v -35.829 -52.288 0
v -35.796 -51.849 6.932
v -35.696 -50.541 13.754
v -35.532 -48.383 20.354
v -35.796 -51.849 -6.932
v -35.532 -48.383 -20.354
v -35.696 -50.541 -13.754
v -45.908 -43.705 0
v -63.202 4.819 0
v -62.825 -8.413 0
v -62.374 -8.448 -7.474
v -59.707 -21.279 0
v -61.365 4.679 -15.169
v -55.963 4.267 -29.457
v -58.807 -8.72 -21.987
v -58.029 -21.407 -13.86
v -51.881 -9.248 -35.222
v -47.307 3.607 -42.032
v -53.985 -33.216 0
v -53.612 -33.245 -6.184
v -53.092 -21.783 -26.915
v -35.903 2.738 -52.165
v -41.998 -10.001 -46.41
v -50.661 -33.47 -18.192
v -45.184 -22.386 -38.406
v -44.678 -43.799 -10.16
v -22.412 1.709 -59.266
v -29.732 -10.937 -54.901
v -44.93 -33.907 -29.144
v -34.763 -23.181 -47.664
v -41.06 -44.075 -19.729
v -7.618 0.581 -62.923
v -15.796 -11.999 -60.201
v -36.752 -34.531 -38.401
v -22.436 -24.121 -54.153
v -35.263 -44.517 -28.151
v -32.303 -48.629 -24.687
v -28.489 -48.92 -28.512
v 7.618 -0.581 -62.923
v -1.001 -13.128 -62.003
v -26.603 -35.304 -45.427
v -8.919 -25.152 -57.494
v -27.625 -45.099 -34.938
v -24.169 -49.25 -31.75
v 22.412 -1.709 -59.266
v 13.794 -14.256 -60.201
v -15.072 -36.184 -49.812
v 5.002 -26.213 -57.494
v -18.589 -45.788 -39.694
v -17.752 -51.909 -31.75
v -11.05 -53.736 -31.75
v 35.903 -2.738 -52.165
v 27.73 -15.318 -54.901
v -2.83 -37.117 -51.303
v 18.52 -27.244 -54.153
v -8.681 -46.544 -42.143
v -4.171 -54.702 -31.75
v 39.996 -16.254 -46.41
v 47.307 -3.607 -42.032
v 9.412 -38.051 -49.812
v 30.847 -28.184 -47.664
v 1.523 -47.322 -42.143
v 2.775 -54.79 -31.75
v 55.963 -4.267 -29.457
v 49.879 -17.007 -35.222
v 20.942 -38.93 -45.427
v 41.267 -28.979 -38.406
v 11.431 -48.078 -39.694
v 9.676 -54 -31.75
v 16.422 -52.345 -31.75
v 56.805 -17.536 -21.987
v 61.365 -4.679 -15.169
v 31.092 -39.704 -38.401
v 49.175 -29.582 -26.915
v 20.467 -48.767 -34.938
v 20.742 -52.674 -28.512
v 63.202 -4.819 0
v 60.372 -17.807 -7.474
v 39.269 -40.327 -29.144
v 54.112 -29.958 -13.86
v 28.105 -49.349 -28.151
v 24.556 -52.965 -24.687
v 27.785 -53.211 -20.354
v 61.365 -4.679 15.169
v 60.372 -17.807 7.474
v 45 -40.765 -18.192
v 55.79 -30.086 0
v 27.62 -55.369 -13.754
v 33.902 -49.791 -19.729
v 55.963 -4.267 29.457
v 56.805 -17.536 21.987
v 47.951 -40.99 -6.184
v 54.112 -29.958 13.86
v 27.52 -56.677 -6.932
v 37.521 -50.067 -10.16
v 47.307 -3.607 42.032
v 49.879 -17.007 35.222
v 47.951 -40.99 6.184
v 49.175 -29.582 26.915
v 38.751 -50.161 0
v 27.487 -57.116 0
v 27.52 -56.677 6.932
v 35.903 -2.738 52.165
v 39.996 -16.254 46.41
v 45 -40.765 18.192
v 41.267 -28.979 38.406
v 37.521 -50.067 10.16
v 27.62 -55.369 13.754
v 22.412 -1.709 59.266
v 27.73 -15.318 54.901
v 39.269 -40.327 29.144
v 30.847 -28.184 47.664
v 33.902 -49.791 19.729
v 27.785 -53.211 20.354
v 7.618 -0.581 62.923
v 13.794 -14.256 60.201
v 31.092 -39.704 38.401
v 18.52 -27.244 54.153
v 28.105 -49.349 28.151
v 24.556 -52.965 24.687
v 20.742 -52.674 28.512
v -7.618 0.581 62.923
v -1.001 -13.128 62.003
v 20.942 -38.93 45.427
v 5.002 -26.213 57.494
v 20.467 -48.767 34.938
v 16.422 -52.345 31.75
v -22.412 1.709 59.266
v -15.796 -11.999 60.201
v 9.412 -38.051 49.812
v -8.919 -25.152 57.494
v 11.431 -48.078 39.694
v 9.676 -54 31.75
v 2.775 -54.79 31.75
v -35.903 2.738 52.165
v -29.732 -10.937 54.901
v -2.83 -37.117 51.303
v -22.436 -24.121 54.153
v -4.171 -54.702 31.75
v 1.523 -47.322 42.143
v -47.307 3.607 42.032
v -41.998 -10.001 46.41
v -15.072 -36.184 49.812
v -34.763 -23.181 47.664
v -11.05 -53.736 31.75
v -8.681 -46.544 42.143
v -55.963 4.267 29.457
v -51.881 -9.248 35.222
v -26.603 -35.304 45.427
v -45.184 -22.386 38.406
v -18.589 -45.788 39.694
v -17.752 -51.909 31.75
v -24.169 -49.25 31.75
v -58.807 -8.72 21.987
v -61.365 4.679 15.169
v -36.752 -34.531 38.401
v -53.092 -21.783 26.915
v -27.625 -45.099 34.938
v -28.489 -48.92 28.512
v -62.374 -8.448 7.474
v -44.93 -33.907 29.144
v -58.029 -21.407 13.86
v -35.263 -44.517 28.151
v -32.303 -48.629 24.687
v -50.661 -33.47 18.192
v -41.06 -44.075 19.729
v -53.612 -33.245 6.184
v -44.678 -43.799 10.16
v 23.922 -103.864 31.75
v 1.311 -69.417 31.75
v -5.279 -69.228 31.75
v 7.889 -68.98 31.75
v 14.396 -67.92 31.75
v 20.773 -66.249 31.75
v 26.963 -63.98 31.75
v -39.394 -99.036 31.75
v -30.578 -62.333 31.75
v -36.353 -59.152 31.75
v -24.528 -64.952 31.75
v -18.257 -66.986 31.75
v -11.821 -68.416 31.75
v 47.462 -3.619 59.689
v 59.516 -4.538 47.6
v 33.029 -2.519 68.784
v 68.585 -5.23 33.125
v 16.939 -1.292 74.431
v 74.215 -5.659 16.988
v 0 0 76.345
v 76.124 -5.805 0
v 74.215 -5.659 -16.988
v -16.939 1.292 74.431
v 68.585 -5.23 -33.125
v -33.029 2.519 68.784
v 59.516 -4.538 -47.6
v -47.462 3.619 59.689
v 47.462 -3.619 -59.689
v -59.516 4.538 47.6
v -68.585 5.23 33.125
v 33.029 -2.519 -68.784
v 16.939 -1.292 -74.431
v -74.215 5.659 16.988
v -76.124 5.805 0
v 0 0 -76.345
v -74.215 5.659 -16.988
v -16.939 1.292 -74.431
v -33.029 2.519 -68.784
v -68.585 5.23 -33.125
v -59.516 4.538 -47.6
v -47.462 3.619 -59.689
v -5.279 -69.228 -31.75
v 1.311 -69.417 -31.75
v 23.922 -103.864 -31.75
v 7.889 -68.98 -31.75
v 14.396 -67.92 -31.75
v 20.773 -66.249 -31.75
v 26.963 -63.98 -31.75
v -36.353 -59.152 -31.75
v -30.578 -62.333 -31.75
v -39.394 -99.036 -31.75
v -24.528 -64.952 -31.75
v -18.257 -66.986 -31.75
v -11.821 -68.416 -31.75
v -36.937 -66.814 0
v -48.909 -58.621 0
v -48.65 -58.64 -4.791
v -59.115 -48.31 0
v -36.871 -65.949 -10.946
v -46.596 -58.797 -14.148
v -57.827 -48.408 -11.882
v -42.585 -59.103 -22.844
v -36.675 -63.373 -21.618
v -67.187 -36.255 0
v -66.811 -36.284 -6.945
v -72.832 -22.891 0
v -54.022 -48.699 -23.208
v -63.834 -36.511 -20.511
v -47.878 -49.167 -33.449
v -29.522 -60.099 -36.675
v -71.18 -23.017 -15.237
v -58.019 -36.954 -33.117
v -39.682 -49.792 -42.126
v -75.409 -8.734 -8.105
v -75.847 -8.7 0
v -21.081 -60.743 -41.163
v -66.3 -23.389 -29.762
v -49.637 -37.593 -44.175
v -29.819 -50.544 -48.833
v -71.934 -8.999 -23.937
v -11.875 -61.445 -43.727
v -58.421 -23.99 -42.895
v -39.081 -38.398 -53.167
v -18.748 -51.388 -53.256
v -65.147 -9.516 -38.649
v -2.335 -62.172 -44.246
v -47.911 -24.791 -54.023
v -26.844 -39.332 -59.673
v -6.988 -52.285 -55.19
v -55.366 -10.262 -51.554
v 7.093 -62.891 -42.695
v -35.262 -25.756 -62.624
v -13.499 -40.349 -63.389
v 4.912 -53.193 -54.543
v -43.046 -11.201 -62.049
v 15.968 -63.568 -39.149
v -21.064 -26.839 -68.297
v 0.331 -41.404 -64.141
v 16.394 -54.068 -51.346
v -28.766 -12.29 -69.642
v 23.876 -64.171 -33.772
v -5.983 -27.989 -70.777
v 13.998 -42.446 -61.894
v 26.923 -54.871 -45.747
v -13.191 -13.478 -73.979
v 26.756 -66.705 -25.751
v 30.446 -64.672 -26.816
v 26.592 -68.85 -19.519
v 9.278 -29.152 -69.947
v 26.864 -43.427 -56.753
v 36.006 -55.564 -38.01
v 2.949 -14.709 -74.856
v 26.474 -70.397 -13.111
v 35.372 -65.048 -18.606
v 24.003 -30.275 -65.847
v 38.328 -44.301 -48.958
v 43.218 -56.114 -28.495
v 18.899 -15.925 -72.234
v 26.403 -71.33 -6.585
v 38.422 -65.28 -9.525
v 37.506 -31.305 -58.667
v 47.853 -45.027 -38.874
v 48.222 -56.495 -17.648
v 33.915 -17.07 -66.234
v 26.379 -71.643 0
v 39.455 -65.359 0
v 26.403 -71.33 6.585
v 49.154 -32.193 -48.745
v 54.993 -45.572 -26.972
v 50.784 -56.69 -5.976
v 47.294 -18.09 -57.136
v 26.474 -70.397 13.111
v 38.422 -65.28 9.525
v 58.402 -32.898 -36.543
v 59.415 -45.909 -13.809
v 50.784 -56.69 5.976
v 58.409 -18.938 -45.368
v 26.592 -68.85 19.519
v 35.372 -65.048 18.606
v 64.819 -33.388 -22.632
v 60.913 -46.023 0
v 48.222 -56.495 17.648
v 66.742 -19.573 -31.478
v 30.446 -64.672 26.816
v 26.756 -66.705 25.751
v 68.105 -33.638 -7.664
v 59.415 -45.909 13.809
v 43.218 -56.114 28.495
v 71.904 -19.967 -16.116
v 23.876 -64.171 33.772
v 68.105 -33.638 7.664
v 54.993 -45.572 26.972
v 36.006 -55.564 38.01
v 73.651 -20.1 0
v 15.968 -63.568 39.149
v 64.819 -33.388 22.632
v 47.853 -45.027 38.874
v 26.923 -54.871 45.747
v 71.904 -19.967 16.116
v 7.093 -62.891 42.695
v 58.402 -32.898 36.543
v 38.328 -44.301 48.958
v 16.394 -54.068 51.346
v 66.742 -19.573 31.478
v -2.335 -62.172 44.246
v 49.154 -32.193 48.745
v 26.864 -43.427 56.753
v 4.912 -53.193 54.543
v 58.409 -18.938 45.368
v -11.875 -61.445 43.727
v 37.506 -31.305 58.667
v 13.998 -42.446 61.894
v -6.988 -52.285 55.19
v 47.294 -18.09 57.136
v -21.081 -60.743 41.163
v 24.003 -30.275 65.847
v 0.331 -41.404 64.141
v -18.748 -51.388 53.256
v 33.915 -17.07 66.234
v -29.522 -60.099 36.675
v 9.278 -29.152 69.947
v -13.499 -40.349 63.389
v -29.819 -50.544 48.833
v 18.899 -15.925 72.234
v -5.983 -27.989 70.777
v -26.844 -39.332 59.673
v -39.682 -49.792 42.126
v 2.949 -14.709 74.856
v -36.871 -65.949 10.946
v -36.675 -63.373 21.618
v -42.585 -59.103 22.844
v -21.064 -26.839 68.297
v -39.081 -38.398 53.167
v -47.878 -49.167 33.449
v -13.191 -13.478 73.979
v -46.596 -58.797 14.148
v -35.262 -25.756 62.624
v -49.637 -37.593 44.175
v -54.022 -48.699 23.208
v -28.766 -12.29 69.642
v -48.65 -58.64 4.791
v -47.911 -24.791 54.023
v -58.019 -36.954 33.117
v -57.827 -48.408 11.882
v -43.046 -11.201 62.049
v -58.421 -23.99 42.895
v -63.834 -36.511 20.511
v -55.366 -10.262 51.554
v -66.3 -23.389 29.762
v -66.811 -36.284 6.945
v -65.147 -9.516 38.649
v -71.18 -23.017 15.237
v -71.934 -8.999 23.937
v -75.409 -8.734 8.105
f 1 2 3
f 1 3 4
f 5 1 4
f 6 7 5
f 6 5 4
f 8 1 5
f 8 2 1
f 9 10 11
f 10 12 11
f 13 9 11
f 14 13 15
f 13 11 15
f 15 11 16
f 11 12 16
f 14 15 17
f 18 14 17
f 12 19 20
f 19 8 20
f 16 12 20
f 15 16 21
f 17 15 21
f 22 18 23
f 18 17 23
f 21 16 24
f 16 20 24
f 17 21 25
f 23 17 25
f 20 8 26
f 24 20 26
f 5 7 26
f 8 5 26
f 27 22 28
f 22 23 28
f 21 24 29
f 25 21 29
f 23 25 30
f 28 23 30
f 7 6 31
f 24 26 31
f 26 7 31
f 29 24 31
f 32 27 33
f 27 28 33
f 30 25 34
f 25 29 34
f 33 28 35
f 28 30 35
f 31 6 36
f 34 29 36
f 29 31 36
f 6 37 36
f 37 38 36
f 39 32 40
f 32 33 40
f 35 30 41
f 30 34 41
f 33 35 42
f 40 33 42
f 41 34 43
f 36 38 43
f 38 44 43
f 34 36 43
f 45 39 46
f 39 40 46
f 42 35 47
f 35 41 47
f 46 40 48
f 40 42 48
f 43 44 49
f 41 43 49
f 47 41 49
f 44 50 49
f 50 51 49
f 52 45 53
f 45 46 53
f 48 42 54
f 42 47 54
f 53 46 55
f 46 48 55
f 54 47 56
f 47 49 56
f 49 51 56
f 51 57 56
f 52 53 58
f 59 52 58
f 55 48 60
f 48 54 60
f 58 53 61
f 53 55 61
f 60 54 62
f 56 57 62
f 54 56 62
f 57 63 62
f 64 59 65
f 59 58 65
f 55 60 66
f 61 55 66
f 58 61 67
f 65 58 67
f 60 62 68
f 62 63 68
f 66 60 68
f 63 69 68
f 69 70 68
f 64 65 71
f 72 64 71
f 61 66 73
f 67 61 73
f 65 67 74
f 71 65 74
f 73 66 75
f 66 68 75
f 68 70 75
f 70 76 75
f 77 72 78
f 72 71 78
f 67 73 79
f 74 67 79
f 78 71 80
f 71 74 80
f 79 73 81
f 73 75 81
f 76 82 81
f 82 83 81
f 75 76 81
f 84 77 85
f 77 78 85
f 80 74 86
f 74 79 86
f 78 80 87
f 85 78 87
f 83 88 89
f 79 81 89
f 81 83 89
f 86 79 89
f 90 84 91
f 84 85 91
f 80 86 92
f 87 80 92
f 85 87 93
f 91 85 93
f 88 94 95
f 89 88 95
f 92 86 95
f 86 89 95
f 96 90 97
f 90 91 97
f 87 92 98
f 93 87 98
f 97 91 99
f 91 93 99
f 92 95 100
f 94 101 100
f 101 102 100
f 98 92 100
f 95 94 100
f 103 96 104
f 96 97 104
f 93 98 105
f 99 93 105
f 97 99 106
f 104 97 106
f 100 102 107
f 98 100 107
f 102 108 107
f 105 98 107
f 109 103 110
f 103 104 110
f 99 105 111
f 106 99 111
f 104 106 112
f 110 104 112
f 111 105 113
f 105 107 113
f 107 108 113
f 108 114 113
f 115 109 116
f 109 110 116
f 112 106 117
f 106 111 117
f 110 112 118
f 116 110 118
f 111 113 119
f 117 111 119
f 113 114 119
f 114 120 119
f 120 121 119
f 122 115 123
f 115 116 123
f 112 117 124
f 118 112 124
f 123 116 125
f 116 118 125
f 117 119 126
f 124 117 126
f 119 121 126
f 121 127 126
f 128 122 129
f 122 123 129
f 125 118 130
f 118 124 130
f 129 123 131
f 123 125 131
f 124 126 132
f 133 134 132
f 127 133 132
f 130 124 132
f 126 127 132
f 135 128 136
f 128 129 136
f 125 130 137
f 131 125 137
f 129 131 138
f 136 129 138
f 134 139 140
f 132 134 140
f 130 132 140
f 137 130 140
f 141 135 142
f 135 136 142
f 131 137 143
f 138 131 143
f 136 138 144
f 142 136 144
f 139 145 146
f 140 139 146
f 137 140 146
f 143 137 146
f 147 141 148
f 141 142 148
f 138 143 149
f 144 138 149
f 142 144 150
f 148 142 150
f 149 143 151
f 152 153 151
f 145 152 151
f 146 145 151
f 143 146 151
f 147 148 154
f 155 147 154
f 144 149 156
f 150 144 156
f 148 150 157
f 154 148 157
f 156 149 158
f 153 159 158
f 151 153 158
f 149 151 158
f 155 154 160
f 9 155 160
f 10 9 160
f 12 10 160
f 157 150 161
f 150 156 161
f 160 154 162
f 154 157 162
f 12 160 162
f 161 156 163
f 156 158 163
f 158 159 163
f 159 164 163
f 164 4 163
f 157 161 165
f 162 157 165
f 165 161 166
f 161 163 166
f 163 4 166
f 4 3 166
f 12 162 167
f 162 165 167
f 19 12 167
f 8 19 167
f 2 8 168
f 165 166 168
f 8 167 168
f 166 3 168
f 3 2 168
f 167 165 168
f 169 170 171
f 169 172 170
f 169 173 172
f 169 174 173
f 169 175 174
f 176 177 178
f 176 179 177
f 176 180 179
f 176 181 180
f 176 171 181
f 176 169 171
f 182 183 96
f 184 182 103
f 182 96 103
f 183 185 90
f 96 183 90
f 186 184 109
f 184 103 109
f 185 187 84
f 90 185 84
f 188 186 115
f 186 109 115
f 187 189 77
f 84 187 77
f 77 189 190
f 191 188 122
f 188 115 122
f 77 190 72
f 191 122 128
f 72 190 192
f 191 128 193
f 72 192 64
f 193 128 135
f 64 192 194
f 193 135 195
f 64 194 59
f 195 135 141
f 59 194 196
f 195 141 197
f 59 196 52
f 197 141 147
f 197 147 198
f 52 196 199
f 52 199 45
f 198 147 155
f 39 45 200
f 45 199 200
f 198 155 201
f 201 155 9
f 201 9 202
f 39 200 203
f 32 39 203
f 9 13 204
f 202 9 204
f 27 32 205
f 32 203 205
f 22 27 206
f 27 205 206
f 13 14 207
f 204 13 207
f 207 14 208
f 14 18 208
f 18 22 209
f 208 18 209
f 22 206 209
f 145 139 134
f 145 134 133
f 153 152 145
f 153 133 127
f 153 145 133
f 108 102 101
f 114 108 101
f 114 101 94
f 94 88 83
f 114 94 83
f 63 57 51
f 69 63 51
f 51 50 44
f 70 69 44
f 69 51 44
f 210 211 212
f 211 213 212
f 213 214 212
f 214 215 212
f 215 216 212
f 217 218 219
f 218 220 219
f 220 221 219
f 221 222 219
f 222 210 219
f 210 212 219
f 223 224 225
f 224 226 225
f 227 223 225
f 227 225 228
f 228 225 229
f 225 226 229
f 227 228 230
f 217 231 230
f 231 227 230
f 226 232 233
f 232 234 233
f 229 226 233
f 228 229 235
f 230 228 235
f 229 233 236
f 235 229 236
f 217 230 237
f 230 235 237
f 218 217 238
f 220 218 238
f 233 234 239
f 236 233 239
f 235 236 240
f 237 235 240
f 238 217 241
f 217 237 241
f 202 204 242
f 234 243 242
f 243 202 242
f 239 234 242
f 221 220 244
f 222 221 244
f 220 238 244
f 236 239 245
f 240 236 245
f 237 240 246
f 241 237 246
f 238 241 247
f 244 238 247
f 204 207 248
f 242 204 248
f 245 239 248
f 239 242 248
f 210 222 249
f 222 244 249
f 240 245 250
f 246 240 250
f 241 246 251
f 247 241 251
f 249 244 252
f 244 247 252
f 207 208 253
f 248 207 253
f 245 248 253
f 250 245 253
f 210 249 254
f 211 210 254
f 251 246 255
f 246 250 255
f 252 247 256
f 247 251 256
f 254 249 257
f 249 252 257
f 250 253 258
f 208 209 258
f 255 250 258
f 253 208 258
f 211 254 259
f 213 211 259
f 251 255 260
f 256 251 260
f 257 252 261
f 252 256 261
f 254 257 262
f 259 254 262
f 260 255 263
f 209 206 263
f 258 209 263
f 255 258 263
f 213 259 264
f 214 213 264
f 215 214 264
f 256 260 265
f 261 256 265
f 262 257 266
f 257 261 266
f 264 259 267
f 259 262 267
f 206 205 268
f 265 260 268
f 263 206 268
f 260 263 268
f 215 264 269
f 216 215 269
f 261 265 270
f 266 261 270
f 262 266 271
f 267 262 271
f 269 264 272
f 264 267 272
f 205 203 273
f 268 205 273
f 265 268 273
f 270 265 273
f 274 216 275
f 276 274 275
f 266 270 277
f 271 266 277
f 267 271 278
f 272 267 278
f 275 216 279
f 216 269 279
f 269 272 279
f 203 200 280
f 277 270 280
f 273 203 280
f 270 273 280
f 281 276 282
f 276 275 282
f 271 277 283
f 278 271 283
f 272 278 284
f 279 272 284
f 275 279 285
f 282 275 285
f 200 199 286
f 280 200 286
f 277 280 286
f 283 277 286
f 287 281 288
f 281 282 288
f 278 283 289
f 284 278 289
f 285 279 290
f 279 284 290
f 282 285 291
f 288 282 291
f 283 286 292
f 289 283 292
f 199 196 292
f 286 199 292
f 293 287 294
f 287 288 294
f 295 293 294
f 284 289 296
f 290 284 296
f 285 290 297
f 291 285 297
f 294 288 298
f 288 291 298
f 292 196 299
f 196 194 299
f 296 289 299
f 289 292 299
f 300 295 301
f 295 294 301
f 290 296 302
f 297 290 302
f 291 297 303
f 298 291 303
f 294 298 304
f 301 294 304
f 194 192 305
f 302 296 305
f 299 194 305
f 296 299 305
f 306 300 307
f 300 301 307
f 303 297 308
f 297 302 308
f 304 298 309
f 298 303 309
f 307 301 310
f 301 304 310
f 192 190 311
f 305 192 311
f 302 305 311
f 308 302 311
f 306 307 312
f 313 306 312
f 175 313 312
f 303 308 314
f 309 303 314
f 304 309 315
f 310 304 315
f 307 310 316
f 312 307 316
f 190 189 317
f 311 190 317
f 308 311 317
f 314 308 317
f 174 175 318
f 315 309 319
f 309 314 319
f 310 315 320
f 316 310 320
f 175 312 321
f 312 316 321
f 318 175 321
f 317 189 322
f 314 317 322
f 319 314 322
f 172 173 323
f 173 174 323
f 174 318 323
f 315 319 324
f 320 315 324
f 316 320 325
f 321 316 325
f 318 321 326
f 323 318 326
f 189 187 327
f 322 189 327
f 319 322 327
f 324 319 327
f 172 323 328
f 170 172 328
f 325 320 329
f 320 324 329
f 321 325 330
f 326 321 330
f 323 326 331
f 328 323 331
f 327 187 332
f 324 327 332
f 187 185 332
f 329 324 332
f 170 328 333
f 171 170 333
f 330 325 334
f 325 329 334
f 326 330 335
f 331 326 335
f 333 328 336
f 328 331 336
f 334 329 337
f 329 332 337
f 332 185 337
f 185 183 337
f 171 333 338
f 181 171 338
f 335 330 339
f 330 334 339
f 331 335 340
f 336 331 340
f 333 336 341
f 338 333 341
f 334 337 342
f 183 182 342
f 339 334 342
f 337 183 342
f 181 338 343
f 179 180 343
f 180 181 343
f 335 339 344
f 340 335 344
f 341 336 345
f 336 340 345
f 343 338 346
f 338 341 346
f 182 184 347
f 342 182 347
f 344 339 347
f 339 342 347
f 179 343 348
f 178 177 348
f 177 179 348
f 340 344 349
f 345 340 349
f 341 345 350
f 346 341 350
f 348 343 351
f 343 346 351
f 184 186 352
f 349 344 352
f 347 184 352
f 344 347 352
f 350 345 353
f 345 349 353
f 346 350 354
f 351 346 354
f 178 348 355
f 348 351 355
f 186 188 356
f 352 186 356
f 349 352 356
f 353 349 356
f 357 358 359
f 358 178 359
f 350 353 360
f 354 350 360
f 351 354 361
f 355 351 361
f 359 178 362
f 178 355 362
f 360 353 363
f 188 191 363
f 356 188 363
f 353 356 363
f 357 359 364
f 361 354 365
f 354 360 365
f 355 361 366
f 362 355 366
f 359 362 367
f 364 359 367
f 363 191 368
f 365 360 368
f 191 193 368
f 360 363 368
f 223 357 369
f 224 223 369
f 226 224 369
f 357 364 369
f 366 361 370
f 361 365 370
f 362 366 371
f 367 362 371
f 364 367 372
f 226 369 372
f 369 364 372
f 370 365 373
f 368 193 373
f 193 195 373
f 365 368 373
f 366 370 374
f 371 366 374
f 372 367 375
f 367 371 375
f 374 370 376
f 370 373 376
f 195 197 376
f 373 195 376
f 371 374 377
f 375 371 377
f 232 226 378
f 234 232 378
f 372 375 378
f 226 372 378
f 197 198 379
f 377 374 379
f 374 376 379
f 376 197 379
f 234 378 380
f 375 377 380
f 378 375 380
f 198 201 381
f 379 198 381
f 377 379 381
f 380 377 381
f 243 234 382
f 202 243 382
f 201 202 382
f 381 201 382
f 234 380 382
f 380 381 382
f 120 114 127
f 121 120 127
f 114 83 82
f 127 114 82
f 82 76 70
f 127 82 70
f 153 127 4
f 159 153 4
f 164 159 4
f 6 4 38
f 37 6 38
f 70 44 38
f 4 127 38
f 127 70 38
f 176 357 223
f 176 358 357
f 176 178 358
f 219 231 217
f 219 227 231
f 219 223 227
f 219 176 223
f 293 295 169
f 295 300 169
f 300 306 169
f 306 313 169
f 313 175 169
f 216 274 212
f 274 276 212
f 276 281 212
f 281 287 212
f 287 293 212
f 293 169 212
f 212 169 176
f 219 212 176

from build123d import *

# Parameters (mm, degrees)
BOSS_EXTRUDE2_DEPTH      = 25.4
BOSS_EXTRUDE2_DEPTH_BACK = 25.4
SKETCH3_W                = 63.5
SKETCH3_H                = 63.5


with BuildPart() as part:
    # Sketch1 → Revolve1 (revolve)
    with BuildSketch(Plane.XY):
        with BuildLine():
            Line((-76.123658673, 5.804761032), (-63.20203376, 4.819430767))
            ThreePointArc((-63.20203376, 4.819430767), (-48.098438833, -41.28273448), (-4.819430767, -63.20203376))
            Line((-4.819430767, -63.20203376), (-5.804761032, -76.123658673))
            ThreePointArc((-5.804761032, -76.123658673), (-57.932141145, -49.722969368), (-76.123658673, 5.804761032))
        make_face()
    revolve(axis=Axis((0, 0, 0), (-0.07603362508452277, -0.9971052541514894, 0)))

    # Sketch3 → Boss-Extrude2 (add, two sides: drawn at the far end of the back side and taken through both)
    with BuildSketch(Plane(origin=(-5.804761032, -76.123658673, 0), x_dir=(-0.9971052541514894, 0.07603362508452276, 0), z_dir=(-0.07603362508452274, -0.9971052541514893, 0)).offset(-BOSS_EXTRUDE2_DEPTH_BACK)):
        Rectangle(SKETCH3_W, SKETCH3_H)
    extrude(amount=BOSS_EXTRUDE2_DEPTH + BOSS_EXTRUDE2_DEPTH_BACK)


solid = part.part
